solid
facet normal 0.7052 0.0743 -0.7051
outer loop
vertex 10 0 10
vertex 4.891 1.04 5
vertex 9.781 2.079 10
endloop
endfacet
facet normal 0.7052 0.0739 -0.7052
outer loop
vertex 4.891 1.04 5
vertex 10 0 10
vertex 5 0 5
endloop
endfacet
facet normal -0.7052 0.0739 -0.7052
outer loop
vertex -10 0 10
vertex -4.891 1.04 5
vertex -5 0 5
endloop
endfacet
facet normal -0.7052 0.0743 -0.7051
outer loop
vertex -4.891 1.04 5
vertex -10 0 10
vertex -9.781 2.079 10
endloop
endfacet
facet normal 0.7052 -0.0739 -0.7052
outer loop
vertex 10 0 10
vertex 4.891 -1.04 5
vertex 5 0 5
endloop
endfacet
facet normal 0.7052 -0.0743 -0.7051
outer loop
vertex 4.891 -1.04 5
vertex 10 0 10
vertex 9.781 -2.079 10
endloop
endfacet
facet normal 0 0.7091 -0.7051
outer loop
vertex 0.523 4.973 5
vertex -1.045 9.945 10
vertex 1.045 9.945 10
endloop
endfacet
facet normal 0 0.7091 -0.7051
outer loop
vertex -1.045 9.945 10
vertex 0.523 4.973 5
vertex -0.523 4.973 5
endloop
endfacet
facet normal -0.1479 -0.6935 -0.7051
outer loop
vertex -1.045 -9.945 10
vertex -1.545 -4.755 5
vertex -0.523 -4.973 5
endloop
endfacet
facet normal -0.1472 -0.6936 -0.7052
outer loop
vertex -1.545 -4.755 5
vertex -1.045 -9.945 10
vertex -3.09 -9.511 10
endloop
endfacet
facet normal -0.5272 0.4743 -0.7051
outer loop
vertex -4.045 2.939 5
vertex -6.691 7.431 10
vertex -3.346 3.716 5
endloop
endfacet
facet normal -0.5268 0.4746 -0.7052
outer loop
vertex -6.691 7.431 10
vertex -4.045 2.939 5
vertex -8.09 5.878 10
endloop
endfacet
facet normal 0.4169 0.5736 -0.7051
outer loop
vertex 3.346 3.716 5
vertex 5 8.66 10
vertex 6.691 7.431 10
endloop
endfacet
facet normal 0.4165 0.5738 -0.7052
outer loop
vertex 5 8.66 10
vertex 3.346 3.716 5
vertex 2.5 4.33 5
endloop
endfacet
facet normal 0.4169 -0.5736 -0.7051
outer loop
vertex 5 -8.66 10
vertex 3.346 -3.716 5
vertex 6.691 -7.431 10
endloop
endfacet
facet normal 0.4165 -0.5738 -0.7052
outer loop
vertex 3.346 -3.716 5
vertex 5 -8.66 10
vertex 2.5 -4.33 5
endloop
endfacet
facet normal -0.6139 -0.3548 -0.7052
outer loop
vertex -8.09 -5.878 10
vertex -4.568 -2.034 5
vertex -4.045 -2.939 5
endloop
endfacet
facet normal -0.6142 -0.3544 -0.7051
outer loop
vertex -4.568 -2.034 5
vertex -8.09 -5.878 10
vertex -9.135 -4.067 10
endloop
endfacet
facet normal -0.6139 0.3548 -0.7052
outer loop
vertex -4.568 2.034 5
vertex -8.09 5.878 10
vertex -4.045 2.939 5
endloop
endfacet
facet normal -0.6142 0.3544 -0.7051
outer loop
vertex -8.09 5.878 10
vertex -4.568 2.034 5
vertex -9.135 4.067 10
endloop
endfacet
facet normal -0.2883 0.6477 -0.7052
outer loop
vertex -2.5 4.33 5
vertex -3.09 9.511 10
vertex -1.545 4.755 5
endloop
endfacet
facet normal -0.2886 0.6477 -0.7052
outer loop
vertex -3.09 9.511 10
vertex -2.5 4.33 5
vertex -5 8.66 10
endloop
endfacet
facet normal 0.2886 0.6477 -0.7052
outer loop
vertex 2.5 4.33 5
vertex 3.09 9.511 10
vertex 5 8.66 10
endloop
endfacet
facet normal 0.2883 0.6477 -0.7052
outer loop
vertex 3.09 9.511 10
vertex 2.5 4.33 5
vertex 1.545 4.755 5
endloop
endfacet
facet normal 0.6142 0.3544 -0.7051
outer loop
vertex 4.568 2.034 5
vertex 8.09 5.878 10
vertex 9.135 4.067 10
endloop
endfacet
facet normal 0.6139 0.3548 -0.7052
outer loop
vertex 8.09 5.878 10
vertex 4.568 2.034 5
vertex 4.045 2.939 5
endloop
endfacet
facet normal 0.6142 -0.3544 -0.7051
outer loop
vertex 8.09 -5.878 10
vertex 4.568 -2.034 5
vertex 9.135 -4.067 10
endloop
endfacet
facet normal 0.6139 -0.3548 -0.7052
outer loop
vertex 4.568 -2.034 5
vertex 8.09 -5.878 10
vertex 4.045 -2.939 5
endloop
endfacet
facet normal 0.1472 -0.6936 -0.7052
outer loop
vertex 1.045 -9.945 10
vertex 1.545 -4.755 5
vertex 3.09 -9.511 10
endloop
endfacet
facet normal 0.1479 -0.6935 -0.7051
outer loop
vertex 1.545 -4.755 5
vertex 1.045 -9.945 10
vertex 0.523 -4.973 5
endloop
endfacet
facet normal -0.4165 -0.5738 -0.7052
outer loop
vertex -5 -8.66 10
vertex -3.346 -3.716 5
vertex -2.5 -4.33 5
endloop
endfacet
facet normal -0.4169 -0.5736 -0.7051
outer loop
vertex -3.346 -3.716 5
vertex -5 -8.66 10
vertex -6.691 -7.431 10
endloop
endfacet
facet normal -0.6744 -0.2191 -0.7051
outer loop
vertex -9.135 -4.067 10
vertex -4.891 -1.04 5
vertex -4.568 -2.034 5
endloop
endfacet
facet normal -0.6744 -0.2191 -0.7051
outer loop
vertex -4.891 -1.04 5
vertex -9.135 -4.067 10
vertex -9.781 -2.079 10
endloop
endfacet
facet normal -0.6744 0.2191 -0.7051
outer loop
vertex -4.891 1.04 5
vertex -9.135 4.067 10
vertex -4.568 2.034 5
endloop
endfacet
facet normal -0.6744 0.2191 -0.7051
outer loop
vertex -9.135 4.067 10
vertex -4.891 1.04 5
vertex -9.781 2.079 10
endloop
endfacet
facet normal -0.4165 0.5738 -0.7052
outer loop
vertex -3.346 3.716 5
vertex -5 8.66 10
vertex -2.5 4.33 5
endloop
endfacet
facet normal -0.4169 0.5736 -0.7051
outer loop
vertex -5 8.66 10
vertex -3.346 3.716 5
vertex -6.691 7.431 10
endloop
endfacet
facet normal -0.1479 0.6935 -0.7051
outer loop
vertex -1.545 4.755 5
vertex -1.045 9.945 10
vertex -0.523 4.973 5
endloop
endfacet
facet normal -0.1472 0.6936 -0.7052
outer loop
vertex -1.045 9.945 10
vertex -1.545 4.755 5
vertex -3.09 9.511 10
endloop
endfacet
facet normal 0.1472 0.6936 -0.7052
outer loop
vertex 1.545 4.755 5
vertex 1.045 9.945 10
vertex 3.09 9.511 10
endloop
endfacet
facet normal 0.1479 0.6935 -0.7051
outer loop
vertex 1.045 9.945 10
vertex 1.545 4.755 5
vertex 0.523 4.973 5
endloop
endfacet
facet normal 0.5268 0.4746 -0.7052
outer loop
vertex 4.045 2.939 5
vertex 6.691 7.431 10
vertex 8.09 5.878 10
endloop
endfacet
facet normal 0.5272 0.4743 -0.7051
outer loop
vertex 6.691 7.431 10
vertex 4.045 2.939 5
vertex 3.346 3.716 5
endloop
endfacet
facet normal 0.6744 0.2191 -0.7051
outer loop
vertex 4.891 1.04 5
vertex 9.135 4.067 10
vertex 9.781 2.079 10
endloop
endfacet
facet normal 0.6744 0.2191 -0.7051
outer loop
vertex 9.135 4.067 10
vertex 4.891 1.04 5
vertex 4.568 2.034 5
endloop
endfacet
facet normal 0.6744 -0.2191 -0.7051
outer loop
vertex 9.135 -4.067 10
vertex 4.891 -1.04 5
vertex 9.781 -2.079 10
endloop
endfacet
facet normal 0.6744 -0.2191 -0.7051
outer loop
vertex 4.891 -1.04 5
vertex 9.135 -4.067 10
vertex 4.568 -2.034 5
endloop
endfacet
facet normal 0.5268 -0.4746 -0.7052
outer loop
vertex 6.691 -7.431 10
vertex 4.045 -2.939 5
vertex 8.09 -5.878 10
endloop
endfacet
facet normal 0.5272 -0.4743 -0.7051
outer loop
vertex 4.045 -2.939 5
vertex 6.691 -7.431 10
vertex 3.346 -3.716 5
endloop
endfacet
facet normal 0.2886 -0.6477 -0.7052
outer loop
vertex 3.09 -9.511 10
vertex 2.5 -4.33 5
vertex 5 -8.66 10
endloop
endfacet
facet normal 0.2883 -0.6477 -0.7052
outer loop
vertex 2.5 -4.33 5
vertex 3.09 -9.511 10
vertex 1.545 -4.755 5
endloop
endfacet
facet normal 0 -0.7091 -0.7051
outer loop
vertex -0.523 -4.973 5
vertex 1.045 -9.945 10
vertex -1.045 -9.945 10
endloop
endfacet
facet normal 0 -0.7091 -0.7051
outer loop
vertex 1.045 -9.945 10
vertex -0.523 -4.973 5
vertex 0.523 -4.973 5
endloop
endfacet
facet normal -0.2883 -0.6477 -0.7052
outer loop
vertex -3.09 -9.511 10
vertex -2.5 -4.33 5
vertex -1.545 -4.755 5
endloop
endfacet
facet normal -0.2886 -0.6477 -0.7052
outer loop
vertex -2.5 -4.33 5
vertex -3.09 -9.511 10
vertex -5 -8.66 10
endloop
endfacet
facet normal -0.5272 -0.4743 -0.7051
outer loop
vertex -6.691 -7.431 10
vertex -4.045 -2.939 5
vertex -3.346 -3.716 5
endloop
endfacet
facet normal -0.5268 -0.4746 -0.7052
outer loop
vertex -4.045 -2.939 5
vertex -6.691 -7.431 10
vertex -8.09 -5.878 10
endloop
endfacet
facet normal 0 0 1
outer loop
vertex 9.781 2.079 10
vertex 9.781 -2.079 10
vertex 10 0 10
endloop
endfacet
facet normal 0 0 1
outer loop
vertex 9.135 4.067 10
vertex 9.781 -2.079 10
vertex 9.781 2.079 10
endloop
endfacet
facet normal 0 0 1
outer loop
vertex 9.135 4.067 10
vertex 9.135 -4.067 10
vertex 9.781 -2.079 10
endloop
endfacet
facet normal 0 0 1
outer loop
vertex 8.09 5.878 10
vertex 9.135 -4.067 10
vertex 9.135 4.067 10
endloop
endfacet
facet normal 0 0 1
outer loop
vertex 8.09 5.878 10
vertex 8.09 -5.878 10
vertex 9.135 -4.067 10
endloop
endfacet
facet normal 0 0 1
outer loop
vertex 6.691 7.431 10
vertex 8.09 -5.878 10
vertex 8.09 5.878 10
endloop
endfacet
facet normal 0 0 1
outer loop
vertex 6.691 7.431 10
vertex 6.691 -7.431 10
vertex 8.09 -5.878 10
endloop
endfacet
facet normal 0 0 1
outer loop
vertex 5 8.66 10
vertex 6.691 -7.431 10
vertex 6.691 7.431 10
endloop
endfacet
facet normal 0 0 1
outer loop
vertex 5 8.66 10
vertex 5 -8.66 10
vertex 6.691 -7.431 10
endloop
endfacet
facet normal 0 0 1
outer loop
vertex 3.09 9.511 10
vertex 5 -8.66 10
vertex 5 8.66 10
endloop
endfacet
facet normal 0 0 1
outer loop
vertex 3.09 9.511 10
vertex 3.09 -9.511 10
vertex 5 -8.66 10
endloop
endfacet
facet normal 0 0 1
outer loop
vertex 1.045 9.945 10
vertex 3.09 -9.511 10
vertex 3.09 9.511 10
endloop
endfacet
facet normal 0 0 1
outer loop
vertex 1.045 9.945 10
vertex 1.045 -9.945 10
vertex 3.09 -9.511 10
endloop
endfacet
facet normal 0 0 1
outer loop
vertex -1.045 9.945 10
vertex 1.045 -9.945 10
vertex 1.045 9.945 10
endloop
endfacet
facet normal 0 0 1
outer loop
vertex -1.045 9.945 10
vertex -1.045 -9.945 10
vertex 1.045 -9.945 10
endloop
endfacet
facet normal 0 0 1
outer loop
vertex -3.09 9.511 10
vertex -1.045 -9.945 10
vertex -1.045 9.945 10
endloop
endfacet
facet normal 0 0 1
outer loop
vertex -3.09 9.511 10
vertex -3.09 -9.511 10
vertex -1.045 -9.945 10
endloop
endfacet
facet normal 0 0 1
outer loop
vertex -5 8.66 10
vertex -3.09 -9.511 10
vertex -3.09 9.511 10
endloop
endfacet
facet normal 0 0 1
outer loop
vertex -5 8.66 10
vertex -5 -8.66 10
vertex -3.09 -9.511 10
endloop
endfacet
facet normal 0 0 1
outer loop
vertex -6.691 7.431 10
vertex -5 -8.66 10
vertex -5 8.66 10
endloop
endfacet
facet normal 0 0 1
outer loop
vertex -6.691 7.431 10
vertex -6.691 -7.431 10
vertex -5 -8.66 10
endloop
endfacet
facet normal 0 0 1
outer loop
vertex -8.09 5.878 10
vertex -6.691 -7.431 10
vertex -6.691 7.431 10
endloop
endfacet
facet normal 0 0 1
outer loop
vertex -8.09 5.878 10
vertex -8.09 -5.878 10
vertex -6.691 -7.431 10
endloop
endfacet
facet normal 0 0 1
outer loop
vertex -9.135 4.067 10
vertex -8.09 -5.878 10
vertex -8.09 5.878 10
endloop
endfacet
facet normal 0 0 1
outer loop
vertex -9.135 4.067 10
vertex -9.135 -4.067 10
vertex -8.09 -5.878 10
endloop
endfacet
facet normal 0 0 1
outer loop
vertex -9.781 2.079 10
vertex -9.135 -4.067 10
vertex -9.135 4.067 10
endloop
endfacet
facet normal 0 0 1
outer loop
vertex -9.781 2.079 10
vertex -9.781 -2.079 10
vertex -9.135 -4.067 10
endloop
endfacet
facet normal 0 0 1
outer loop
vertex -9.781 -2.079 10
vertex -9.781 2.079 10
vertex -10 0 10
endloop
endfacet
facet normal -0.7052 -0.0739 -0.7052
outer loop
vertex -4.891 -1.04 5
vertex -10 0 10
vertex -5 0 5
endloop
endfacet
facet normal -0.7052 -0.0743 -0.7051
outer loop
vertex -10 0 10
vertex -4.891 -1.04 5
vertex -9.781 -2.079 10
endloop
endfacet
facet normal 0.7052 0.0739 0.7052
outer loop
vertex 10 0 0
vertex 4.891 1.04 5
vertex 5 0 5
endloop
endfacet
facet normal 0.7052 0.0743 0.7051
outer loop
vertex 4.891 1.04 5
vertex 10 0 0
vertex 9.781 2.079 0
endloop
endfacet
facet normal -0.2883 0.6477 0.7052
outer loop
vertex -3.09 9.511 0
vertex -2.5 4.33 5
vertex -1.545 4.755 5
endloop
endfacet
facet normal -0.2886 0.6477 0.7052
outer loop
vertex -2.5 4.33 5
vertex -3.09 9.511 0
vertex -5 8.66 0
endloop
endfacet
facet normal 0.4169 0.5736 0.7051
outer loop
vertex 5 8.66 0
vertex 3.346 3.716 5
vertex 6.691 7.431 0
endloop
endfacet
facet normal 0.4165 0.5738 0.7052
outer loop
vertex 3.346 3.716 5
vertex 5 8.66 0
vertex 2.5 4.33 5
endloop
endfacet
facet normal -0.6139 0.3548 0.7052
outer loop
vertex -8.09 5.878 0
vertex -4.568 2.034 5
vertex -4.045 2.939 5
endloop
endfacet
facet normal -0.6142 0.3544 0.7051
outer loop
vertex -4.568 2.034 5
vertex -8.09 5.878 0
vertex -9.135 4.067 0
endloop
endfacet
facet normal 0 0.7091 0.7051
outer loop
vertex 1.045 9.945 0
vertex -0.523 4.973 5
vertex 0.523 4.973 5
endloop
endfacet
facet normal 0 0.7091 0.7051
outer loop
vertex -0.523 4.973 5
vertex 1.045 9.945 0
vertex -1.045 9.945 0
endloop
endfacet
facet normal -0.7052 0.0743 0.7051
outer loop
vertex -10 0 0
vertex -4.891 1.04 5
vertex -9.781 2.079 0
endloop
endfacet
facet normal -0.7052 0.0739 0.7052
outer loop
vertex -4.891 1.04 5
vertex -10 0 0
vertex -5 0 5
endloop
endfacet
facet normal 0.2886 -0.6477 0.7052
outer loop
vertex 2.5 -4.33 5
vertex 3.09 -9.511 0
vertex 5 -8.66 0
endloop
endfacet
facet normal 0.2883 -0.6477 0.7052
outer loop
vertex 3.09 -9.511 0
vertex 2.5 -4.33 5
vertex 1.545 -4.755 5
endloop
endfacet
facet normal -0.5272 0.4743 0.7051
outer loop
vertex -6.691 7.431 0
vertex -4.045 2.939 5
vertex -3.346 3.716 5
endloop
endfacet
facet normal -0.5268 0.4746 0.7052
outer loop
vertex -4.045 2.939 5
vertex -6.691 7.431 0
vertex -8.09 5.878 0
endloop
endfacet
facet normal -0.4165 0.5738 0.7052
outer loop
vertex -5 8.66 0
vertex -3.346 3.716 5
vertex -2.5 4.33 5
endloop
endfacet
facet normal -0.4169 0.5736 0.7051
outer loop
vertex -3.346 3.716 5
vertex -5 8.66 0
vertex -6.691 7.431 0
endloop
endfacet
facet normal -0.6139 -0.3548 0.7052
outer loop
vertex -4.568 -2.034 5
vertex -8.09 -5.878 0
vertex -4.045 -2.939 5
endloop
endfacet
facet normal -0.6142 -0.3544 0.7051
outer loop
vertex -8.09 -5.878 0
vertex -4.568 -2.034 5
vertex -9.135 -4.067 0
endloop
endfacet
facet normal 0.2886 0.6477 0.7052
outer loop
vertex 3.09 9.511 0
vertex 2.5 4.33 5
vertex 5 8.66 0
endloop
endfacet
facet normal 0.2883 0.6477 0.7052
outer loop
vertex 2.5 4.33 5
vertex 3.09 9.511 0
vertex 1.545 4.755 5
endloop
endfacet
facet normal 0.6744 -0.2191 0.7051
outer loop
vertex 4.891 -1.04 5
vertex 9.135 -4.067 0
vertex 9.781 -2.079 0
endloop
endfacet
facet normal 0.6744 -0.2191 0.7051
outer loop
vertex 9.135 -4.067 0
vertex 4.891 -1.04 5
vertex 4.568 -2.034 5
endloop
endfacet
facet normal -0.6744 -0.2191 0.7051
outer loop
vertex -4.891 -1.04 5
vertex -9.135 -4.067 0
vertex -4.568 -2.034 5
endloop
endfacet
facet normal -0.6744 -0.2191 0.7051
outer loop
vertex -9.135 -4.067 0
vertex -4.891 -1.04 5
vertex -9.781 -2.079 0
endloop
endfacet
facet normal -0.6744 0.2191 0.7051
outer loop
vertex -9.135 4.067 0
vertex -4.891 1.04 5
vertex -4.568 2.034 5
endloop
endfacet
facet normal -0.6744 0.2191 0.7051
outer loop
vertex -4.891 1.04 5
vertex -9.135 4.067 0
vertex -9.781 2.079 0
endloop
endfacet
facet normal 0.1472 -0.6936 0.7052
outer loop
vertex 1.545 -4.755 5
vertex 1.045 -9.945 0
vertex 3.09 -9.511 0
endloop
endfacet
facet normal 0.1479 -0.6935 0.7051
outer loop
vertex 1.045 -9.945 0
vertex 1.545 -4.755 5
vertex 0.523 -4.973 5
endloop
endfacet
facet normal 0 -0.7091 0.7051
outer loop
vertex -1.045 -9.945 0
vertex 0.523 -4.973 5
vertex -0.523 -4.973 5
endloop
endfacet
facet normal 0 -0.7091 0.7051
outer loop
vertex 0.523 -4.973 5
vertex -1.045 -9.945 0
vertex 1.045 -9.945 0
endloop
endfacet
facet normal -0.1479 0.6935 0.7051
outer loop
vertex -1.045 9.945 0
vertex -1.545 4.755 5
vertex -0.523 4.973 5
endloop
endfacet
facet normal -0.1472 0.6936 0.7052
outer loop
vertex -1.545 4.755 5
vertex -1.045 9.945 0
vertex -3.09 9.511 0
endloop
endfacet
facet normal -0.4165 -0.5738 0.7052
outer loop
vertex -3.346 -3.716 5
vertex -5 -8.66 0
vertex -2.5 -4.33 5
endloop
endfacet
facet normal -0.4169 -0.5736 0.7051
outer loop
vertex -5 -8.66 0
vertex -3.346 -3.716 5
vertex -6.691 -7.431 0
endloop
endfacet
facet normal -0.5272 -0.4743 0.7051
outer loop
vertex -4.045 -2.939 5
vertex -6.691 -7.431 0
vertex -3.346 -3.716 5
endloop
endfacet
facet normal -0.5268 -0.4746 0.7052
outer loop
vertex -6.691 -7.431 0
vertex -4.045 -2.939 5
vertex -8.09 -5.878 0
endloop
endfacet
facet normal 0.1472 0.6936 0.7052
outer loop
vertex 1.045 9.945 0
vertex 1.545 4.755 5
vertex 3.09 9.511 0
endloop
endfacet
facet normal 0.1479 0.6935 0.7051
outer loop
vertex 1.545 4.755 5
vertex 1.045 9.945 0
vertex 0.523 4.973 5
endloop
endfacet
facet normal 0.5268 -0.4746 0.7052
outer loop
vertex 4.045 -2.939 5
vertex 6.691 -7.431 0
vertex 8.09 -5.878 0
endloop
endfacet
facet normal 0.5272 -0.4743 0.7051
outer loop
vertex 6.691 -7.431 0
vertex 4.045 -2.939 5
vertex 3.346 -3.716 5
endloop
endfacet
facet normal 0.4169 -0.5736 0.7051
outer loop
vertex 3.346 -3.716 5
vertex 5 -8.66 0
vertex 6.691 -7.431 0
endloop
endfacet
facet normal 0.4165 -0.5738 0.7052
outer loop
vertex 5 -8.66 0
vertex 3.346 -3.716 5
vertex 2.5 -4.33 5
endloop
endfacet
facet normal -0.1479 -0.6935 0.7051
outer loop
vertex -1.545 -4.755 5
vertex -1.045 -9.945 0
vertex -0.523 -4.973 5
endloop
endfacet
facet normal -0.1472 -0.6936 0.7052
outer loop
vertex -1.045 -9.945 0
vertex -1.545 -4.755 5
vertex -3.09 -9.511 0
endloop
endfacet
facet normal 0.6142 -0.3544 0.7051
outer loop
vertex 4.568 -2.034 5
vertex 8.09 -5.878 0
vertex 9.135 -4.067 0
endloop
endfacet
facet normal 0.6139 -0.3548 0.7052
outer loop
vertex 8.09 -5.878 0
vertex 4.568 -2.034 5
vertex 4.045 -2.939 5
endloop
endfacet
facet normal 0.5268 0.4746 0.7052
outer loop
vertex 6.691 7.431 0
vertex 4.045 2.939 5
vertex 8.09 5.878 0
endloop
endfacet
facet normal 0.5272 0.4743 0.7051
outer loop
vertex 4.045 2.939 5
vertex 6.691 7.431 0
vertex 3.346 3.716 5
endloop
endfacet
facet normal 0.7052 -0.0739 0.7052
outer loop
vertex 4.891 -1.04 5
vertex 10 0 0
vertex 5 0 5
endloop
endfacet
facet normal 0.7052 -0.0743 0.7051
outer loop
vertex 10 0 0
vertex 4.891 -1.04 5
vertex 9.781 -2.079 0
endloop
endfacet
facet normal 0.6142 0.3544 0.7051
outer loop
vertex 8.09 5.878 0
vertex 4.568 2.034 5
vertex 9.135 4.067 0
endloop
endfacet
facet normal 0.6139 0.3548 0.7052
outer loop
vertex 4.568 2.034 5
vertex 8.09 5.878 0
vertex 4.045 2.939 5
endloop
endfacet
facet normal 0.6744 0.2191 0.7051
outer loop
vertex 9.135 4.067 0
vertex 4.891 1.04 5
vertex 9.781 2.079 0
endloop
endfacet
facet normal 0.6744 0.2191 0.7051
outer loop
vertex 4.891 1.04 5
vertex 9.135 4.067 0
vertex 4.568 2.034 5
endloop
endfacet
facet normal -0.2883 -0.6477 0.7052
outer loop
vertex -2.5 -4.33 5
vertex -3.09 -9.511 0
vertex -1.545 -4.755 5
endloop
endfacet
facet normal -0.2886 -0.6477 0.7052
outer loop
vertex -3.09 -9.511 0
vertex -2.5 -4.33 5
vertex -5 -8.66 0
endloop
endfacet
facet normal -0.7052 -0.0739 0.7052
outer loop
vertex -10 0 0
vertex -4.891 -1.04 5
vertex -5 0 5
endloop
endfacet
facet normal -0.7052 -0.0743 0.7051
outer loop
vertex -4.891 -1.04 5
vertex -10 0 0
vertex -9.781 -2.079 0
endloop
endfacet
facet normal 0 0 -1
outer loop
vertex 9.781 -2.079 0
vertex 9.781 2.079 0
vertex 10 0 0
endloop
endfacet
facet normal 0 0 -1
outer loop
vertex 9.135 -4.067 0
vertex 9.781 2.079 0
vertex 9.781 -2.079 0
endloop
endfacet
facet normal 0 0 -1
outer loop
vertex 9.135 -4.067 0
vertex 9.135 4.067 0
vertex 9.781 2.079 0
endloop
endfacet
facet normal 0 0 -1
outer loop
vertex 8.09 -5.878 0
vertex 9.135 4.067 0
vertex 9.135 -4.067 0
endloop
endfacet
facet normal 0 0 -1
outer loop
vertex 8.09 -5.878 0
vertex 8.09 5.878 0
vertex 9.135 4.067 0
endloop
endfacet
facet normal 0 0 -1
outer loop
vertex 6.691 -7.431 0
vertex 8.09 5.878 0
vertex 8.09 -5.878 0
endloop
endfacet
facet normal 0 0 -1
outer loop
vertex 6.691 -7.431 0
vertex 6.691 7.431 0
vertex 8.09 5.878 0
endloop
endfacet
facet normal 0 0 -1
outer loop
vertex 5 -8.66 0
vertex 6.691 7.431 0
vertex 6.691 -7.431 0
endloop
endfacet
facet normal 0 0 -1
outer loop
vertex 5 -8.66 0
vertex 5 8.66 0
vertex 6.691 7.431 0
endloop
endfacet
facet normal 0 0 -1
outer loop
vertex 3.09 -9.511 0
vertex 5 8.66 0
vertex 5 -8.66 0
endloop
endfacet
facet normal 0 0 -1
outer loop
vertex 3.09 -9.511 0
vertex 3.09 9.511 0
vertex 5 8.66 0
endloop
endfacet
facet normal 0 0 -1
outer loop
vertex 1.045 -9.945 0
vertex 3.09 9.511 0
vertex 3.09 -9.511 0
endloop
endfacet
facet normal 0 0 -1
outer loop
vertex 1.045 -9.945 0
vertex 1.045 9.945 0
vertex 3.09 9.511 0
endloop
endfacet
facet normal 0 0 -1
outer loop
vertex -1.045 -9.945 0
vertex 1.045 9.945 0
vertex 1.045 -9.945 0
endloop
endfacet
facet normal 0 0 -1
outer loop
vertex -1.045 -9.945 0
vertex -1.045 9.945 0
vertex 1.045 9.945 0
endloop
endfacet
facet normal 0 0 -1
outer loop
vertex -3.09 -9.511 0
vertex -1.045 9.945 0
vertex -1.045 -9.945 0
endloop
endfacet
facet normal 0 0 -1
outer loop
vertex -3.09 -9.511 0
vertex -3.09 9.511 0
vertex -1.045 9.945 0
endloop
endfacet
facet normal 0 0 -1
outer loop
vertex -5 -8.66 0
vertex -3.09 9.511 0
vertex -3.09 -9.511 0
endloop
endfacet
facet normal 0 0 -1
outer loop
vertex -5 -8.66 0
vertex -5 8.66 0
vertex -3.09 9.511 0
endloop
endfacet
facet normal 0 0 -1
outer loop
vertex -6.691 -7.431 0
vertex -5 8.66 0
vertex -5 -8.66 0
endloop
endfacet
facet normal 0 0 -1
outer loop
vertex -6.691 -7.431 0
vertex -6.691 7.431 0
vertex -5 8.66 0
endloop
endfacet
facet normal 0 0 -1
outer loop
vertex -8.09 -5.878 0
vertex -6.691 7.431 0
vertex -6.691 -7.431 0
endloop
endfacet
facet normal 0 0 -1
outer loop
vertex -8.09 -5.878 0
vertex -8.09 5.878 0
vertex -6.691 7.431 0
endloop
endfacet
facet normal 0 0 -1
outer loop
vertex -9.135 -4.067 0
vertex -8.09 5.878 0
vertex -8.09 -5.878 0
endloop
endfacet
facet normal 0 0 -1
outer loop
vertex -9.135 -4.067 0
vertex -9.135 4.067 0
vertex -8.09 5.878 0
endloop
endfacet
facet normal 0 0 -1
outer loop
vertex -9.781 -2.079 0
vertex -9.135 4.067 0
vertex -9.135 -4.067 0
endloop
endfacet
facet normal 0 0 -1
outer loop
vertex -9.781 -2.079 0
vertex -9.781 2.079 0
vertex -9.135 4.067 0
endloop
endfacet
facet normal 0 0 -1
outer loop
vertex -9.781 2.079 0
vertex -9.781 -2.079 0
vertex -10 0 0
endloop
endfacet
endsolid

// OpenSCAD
//3D Shapes- Design Time: Yo Yo

cylinder(10, 0, 10);
cylinder(10, 10, 0);
